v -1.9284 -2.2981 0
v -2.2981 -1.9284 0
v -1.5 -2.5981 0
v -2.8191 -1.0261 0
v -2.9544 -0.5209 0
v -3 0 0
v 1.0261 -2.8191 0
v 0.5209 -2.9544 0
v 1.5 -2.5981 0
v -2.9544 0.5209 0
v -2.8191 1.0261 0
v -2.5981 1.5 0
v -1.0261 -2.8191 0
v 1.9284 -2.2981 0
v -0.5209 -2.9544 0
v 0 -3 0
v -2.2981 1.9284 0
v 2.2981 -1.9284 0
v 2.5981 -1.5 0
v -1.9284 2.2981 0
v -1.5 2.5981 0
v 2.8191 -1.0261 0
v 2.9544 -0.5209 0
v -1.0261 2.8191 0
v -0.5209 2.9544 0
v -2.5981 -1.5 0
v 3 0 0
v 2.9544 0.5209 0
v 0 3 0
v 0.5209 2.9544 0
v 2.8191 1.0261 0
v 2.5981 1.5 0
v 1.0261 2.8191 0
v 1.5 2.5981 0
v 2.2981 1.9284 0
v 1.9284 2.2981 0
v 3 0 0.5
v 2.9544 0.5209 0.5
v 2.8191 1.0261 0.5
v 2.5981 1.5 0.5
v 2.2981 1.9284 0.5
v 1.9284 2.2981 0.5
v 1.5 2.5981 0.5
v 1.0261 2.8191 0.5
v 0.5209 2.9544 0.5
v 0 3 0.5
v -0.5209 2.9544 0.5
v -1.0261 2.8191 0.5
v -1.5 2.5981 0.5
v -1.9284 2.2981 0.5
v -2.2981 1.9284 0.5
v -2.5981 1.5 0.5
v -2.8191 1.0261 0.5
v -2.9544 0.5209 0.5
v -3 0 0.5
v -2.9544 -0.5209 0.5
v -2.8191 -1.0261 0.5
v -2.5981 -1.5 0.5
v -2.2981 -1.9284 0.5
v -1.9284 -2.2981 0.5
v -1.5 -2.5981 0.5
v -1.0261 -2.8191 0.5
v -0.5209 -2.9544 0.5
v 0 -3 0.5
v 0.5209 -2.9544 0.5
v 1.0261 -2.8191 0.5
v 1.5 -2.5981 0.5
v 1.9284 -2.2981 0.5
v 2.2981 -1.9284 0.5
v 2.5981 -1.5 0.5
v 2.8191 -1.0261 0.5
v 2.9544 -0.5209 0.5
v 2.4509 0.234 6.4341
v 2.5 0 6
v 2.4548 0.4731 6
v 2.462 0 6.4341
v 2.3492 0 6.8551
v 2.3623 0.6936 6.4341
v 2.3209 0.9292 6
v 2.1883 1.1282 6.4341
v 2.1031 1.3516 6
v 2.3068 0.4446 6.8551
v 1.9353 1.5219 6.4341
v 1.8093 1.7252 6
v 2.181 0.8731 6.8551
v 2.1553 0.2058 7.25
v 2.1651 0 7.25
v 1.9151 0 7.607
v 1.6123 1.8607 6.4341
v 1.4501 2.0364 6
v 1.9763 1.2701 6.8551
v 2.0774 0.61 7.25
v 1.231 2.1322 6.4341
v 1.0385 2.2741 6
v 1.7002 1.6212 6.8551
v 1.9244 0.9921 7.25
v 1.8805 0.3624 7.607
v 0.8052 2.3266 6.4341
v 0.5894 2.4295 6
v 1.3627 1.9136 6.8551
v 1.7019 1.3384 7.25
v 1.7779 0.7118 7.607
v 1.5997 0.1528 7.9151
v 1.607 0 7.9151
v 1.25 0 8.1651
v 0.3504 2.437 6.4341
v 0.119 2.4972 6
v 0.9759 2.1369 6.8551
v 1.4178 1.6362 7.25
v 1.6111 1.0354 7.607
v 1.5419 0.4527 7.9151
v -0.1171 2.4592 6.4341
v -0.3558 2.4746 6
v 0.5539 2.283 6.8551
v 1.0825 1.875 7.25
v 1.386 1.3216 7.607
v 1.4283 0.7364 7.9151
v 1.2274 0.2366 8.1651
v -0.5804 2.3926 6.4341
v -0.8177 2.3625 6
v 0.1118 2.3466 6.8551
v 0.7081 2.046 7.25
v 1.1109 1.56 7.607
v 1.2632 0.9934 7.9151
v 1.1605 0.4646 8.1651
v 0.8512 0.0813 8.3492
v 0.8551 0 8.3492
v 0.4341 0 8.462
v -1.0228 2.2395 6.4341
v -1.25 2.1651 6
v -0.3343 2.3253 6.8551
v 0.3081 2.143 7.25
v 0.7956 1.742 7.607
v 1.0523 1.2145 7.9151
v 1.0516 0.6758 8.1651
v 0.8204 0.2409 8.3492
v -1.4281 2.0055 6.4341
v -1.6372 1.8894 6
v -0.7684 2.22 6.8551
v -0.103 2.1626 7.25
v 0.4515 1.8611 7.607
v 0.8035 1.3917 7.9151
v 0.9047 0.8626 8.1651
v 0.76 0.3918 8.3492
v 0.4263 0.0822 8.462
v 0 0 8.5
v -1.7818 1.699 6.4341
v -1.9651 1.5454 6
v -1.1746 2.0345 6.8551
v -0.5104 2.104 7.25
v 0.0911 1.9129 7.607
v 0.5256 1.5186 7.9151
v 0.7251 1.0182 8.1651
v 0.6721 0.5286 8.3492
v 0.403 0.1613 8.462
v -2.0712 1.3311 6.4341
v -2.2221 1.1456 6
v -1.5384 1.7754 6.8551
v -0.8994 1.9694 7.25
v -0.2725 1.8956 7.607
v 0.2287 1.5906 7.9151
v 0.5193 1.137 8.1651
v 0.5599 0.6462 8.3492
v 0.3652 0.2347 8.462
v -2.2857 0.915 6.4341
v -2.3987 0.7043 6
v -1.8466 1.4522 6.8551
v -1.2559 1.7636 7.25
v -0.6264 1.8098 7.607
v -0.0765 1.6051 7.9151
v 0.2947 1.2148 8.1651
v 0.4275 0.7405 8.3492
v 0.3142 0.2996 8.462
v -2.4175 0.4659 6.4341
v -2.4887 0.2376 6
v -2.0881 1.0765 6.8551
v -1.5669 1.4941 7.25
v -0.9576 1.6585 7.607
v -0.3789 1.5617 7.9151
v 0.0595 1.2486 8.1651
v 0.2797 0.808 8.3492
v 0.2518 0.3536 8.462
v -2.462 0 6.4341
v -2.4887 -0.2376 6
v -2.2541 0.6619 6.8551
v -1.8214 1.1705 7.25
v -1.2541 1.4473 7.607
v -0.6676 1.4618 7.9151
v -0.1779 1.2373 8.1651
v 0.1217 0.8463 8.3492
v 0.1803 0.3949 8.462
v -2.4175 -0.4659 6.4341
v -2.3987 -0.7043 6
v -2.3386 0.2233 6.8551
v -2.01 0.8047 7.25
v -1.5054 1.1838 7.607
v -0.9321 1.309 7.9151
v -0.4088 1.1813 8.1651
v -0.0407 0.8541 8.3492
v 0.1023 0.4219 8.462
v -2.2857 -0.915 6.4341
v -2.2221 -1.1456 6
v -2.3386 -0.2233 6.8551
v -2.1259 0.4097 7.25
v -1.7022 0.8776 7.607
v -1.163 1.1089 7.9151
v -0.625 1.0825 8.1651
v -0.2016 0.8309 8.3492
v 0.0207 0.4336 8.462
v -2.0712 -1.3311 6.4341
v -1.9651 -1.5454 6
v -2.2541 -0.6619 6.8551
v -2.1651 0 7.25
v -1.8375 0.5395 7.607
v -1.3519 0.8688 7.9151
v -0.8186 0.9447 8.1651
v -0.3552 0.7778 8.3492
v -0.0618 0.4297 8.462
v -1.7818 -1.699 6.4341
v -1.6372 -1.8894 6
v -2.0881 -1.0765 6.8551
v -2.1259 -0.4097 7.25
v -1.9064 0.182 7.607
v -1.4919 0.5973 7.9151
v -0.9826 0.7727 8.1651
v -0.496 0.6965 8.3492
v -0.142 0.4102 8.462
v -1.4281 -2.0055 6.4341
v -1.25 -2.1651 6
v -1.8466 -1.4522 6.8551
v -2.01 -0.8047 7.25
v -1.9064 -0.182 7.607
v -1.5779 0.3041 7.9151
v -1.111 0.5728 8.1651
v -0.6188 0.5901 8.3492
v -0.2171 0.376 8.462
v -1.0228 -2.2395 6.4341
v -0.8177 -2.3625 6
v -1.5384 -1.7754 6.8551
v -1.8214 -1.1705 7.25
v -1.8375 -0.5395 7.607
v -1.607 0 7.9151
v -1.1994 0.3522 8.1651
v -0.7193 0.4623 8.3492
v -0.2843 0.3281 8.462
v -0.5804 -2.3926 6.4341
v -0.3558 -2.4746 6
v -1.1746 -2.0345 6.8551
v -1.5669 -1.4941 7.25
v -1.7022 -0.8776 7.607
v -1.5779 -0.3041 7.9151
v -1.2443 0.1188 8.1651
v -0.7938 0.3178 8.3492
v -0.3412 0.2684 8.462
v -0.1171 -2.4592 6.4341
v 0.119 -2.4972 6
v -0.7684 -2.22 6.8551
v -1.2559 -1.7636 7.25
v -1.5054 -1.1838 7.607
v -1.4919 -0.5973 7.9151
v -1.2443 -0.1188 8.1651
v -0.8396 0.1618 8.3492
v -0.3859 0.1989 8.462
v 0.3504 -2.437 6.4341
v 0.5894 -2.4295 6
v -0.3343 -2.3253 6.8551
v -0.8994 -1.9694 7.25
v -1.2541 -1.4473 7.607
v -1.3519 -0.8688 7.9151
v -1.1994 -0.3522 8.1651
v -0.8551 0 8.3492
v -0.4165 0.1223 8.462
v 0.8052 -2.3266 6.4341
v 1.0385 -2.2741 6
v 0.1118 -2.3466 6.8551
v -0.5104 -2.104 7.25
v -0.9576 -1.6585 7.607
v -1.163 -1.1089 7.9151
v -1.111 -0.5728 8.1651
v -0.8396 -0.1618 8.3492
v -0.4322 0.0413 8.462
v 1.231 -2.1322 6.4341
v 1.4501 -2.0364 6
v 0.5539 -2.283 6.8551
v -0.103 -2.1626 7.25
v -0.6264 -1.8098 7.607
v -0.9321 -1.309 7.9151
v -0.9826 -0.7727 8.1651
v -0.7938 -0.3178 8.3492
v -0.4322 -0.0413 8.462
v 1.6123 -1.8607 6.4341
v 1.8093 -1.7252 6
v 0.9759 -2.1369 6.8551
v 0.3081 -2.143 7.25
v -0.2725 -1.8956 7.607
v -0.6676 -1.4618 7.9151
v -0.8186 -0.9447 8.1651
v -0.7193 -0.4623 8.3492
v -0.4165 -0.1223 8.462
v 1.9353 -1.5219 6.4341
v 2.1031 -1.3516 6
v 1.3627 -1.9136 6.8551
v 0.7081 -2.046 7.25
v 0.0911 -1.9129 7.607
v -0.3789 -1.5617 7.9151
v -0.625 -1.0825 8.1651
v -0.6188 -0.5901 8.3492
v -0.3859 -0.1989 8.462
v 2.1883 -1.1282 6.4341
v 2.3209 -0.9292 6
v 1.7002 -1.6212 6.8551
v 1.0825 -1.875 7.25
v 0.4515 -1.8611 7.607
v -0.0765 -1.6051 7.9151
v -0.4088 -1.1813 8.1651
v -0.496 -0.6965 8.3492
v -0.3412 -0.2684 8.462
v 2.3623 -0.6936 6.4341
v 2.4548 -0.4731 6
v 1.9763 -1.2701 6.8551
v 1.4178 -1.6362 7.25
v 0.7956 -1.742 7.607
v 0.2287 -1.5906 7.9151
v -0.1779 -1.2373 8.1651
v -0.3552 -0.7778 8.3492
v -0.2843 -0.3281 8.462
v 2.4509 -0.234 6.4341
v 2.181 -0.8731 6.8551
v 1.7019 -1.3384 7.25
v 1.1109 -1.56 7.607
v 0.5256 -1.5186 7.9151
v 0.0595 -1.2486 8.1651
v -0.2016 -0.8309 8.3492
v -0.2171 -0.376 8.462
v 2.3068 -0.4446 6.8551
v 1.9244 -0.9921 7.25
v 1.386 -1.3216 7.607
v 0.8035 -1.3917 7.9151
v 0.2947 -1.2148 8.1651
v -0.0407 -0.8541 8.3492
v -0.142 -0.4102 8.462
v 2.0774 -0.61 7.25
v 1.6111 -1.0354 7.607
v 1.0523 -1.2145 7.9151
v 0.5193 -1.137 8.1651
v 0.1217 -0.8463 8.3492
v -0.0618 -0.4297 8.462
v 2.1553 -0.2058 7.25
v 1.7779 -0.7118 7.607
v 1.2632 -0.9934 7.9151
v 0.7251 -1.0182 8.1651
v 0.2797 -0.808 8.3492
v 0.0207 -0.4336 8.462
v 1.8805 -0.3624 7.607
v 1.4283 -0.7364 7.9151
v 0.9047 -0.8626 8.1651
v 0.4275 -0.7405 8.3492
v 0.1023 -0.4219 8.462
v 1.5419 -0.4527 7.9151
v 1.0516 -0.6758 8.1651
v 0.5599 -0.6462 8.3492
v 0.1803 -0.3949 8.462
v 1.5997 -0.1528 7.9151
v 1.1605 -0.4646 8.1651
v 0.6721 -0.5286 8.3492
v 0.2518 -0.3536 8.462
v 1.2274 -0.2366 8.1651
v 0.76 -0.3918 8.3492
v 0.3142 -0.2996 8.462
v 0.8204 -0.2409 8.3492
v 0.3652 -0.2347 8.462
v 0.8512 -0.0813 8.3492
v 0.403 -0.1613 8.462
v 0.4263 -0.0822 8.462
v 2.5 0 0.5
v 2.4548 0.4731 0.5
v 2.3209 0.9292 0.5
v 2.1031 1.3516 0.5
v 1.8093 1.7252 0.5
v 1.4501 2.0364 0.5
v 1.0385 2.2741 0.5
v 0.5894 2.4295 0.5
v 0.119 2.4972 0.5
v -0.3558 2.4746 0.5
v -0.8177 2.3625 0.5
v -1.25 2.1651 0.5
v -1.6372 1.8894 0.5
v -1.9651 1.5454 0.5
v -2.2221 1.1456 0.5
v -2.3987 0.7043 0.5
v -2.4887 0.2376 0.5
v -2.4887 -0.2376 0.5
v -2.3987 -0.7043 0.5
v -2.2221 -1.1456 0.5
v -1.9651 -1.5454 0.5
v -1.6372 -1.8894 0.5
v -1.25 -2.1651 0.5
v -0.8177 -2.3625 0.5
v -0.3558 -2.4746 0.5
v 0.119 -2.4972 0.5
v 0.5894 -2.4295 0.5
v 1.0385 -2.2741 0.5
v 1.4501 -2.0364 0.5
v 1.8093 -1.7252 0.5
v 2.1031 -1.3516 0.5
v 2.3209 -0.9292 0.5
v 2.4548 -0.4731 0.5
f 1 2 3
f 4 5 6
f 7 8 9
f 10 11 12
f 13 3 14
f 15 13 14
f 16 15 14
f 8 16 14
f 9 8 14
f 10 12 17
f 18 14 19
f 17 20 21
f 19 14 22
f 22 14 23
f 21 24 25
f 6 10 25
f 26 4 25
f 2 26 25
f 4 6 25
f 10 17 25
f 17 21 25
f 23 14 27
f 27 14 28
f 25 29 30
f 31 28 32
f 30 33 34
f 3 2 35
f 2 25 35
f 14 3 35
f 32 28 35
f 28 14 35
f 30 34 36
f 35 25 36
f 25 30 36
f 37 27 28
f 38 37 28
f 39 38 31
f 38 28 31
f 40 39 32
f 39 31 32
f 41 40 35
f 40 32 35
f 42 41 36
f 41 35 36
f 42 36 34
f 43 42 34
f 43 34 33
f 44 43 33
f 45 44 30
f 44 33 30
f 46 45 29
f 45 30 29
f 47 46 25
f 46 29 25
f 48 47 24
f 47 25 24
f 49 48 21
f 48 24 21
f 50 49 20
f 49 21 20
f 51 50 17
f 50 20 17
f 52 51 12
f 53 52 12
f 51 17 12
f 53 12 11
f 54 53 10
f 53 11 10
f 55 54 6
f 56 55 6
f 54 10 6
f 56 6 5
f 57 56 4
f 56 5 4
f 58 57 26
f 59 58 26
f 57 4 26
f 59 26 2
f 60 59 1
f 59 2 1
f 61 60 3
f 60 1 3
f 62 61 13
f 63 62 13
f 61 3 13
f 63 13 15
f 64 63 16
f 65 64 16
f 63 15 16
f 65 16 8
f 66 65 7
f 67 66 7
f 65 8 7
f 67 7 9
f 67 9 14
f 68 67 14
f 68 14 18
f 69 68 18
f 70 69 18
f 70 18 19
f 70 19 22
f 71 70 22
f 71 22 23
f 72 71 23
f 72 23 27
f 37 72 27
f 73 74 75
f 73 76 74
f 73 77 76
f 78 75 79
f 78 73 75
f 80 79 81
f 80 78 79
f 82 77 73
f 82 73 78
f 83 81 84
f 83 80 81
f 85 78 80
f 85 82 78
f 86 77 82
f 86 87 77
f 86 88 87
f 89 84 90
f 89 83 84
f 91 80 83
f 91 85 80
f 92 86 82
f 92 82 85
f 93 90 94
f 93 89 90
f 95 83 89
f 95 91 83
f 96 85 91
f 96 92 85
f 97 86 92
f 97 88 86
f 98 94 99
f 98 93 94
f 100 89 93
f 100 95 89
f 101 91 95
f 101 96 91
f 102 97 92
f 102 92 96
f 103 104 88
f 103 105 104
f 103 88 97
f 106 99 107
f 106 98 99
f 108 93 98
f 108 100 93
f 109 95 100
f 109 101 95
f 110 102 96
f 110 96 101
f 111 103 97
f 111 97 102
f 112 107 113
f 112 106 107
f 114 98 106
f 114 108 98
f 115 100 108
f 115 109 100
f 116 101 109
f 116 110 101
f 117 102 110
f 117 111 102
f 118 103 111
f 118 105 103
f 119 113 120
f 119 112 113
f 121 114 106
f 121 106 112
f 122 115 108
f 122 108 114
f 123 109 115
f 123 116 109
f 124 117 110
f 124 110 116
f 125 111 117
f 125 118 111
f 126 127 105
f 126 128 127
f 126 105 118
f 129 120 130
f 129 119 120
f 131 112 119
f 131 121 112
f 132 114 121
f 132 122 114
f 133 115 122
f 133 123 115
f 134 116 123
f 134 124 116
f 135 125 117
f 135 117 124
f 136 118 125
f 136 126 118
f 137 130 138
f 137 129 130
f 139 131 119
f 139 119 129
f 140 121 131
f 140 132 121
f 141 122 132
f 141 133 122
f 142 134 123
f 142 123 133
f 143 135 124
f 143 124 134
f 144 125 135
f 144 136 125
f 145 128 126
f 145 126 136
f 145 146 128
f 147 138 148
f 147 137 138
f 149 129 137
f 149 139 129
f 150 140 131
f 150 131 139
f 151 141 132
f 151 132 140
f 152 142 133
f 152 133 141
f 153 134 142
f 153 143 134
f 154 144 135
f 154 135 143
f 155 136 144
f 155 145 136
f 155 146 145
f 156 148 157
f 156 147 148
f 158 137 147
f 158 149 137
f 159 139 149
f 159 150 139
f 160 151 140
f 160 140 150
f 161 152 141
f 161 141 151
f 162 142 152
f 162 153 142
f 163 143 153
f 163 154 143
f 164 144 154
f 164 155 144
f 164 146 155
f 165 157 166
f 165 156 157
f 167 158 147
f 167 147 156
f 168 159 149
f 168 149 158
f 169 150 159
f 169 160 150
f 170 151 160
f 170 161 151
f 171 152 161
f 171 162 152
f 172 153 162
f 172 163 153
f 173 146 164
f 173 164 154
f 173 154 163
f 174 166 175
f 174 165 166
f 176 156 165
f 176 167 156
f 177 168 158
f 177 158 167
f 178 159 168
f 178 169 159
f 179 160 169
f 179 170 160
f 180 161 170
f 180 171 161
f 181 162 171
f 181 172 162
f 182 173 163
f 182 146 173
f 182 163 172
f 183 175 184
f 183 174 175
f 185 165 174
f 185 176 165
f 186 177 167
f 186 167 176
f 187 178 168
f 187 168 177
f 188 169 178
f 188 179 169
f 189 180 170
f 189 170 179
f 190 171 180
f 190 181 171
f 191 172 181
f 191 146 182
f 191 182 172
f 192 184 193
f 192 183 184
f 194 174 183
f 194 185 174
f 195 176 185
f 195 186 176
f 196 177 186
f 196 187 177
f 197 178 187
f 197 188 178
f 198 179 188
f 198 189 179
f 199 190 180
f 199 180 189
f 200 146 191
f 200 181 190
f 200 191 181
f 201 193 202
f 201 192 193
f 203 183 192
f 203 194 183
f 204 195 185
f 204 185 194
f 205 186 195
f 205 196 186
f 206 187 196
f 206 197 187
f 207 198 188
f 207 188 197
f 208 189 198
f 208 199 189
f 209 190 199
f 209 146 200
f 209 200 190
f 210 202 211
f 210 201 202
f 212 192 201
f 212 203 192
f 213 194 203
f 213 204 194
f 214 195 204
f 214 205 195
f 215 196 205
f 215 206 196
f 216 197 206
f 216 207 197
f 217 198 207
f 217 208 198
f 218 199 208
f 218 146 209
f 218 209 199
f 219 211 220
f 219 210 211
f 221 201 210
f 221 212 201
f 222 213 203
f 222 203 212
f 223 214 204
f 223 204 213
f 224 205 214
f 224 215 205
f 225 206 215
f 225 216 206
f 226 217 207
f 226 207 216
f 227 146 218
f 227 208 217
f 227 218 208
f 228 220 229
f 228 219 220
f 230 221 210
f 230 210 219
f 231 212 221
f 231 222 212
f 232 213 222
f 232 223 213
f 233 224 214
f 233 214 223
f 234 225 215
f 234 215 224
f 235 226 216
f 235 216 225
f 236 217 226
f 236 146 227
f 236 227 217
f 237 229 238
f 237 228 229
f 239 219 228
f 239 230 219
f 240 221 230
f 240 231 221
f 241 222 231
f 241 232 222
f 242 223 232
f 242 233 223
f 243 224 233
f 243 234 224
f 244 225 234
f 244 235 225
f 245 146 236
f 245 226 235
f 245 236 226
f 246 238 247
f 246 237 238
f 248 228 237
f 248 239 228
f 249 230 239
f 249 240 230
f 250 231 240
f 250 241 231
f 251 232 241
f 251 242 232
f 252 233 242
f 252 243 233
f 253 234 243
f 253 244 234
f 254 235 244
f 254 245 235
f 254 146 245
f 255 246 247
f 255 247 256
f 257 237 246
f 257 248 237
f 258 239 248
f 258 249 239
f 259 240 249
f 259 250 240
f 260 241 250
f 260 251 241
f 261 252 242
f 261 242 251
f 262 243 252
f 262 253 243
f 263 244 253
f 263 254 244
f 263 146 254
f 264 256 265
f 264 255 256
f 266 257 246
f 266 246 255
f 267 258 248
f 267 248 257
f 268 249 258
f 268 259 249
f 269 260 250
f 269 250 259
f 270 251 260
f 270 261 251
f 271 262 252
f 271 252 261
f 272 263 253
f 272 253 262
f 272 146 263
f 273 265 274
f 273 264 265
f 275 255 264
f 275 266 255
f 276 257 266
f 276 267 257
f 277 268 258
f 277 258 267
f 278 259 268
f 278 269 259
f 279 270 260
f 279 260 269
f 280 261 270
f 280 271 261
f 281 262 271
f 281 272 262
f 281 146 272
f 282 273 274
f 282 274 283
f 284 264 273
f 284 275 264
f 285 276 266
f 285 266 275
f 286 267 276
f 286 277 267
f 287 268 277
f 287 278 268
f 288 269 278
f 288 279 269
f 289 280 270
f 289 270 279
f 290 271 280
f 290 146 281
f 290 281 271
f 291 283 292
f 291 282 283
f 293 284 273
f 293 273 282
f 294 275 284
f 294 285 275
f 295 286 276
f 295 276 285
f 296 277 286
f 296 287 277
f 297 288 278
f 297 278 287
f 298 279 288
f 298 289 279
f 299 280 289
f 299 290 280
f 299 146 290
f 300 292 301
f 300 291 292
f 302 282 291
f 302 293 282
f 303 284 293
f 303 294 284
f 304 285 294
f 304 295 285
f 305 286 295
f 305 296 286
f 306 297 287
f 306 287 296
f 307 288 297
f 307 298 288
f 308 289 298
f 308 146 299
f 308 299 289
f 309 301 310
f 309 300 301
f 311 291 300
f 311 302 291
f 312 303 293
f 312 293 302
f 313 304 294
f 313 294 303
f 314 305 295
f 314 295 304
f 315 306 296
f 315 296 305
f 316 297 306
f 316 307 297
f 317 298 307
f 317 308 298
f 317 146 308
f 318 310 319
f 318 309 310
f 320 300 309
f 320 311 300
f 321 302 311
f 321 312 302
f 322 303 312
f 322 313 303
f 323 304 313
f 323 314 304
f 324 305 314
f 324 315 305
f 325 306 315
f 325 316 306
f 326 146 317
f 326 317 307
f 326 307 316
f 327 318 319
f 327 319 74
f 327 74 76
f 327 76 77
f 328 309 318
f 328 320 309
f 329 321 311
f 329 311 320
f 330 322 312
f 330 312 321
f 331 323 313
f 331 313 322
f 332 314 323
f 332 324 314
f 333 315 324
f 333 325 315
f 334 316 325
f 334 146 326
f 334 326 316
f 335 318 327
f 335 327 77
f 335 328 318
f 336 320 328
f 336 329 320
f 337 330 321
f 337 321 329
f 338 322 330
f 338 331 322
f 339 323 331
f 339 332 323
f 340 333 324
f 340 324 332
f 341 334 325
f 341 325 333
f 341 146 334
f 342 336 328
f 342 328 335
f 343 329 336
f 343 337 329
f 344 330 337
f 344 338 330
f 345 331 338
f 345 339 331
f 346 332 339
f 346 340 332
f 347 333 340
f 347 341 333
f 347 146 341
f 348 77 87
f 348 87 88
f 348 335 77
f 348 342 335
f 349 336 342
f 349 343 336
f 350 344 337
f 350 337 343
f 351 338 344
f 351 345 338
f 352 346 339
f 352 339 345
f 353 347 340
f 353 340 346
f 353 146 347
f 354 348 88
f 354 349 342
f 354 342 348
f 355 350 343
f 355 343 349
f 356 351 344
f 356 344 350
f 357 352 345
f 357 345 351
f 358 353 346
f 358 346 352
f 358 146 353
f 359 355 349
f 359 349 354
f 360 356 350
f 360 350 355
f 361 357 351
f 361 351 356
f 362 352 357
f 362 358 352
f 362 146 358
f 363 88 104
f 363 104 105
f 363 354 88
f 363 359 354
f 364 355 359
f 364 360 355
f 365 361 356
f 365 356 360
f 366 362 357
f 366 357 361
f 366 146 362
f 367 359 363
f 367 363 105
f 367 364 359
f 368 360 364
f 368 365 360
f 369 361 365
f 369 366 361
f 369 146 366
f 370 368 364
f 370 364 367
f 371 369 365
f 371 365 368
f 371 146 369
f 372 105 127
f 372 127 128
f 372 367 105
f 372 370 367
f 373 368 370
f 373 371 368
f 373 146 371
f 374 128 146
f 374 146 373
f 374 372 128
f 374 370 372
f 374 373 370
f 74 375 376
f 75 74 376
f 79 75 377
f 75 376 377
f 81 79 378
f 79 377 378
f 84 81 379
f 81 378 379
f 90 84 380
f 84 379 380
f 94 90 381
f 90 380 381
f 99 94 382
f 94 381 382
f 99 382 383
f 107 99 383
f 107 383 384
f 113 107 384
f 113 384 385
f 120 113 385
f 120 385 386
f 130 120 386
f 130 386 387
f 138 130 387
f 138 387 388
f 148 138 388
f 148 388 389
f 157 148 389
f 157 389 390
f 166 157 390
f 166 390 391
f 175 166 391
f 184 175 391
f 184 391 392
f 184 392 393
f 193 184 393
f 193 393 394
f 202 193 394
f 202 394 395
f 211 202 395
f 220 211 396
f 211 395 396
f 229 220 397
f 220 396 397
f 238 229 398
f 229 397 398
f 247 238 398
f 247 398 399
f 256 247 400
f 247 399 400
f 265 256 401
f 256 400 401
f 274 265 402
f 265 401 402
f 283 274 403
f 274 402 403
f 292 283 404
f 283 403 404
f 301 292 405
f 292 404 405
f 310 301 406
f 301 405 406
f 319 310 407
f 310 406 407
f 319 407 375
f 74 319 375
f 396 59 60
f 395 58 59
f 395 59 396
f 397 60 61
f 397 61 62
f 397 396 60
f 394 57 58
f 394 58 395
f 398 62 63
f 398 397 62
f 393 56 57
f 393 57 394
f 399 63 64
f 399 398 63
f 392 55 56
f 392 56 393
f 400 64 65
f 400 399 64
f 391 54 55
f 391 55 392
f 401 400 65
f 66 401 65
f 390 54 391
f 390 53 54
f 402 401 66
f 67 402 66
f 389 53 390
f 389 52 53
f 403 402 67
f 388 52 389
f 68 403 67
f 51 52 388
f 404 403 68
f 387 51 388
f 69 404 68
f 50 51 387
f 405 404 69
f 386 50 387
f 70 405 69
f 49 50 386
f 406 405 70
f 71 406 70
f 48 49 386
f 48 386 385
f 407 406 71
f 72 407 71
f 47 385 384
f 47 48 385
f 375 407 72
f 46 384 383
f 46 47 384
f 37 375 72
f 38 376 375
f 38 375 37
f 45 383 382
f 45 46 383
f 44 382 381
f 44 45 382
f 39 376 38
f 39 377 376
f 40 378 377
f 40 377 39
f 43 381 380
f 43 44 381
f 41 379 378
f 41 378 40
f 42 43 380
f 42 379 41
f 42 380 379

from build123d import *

# Parameters (mm, degrees)
CYLINDER001_R     = 3
CYLINDER001_DEPTH = 0.5
CYLINDER_R        = 2.5
CYLINDER_DEPTH    = 6


with BuildPart() as sphere:
    # Sphere → Sphere (revolve)
    with BuildSketch(Plane(origin=(0, 0, 6), x_dir=(1, 0, 0), z_dir=(0, -1, 0))):
        with BuildLine():
            ThreePointArc((0, -2.5), (2.5, 0), (0, 2.5))
            Line((0, 2.5), (0, -2.5))
        make_face()
    revolve(axis=Axis((0, 0, 6), (0, 0, 1)))


with BuildPart() as cylinder001:
    # Cylinder001 → Cylinder001 (new body)
    with BuildSketch(Plane.XY):
        Circle(CYLINDER001_R)
    extrude(amount=CYLINDER001_DEPTH)


with BuildPart() as led_5mm:
    # Cylinder → Cylinder (new body)
    with BuildSketch(Plane.XY):
        Circle(CYLINDER_R)
    extrude(amount=CYLINDER_DEPTH)

    # Fusion: union Sphere, Cylinder001
    add(sphere.part)
    add(cylinder001.part)


solid = led_5mm.part
